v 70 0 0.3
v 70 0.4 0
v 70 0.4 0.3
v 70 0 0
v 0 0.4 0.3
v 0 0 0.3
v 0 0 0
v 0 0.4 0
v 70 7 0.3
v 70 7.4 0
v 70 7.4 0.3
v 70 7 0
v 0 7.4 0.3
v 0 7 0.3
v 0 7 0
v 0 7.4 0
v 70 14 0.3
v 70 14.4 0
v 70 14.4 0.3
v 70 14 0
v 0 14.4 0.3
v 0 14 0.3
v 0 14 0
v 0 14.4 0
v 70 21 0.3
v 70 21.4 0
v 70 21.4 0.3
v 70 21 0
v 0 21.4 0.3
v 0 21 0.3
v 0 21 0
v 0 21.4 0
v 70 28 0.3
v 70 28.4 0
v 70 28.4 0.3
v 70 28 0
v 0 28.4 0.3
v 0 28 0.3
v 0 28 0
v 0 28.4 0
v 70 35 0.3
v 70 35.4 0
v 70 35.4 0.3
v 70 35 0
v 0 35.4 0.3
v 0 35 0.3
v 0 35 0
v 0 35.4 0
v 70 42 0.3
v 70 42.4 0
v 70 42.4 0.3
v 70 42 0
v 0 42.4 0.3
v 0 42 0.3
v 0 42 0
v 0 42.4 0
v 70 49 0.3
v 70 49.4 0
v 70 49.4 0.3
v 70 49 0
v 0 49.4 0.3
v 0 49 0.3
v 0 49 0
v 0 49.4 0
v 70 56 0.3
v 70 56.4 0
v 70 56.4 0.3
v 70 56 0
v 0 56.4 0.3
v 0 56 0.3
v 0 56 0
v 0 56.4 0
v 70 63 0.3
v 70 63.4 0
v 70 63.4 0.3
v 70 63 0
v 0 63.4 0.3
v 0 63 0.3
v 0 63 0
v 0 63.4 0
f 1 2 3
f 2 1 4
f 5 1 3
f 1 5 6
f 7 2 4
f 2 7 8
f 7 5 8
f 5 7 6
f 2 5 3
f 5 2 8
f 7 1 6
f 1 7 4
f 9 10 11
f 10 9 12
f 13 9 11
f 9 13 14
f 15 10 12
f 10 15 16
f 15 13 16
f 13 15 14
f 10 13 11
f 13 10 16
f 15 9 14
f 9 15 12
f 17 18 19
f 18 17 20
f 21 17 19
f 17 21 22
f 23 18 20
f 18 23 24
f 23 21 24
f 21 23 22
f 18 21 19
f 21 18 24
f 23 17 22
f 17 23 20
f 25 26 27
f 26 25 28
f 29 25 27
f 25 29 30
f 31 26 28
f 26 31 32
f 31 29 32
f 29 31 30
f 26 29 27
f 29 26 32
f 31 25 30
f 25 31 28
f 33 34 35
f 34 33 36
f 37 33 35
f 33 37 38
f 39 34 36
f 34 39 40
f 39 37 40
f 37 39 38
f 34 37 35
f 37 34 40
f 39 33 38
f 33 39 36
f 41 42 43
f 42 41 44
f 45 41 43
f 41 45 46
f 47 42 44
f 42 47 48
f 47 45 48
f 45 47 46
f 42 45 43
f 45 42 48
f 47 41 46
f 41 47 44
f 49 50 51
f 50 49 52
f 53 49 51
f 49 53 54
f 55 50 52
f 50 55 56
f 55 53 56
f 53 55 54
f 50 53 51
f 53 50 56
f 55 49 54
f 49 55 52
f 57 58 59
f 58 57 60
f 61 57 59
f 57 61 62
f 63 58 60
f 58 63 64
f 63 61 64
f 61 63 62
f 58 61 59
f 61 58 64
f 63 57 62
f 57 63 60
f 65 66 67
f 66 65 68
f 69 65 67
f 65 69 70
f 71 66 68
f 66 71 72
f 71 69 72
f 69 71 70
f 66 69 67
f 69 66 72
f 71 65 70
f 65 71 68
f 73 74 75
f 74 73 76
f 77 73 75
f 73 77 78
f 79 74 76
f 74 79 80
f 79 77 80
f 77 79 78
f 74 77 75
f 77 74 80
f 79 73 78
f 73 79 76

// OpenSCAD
extrusionWidth=0.4;
layerHeight=0.3;

for (i=[0:9]) {
   translate([0,7*i,0]) cube([70,extrusionWidth,layerHeight]);
}
